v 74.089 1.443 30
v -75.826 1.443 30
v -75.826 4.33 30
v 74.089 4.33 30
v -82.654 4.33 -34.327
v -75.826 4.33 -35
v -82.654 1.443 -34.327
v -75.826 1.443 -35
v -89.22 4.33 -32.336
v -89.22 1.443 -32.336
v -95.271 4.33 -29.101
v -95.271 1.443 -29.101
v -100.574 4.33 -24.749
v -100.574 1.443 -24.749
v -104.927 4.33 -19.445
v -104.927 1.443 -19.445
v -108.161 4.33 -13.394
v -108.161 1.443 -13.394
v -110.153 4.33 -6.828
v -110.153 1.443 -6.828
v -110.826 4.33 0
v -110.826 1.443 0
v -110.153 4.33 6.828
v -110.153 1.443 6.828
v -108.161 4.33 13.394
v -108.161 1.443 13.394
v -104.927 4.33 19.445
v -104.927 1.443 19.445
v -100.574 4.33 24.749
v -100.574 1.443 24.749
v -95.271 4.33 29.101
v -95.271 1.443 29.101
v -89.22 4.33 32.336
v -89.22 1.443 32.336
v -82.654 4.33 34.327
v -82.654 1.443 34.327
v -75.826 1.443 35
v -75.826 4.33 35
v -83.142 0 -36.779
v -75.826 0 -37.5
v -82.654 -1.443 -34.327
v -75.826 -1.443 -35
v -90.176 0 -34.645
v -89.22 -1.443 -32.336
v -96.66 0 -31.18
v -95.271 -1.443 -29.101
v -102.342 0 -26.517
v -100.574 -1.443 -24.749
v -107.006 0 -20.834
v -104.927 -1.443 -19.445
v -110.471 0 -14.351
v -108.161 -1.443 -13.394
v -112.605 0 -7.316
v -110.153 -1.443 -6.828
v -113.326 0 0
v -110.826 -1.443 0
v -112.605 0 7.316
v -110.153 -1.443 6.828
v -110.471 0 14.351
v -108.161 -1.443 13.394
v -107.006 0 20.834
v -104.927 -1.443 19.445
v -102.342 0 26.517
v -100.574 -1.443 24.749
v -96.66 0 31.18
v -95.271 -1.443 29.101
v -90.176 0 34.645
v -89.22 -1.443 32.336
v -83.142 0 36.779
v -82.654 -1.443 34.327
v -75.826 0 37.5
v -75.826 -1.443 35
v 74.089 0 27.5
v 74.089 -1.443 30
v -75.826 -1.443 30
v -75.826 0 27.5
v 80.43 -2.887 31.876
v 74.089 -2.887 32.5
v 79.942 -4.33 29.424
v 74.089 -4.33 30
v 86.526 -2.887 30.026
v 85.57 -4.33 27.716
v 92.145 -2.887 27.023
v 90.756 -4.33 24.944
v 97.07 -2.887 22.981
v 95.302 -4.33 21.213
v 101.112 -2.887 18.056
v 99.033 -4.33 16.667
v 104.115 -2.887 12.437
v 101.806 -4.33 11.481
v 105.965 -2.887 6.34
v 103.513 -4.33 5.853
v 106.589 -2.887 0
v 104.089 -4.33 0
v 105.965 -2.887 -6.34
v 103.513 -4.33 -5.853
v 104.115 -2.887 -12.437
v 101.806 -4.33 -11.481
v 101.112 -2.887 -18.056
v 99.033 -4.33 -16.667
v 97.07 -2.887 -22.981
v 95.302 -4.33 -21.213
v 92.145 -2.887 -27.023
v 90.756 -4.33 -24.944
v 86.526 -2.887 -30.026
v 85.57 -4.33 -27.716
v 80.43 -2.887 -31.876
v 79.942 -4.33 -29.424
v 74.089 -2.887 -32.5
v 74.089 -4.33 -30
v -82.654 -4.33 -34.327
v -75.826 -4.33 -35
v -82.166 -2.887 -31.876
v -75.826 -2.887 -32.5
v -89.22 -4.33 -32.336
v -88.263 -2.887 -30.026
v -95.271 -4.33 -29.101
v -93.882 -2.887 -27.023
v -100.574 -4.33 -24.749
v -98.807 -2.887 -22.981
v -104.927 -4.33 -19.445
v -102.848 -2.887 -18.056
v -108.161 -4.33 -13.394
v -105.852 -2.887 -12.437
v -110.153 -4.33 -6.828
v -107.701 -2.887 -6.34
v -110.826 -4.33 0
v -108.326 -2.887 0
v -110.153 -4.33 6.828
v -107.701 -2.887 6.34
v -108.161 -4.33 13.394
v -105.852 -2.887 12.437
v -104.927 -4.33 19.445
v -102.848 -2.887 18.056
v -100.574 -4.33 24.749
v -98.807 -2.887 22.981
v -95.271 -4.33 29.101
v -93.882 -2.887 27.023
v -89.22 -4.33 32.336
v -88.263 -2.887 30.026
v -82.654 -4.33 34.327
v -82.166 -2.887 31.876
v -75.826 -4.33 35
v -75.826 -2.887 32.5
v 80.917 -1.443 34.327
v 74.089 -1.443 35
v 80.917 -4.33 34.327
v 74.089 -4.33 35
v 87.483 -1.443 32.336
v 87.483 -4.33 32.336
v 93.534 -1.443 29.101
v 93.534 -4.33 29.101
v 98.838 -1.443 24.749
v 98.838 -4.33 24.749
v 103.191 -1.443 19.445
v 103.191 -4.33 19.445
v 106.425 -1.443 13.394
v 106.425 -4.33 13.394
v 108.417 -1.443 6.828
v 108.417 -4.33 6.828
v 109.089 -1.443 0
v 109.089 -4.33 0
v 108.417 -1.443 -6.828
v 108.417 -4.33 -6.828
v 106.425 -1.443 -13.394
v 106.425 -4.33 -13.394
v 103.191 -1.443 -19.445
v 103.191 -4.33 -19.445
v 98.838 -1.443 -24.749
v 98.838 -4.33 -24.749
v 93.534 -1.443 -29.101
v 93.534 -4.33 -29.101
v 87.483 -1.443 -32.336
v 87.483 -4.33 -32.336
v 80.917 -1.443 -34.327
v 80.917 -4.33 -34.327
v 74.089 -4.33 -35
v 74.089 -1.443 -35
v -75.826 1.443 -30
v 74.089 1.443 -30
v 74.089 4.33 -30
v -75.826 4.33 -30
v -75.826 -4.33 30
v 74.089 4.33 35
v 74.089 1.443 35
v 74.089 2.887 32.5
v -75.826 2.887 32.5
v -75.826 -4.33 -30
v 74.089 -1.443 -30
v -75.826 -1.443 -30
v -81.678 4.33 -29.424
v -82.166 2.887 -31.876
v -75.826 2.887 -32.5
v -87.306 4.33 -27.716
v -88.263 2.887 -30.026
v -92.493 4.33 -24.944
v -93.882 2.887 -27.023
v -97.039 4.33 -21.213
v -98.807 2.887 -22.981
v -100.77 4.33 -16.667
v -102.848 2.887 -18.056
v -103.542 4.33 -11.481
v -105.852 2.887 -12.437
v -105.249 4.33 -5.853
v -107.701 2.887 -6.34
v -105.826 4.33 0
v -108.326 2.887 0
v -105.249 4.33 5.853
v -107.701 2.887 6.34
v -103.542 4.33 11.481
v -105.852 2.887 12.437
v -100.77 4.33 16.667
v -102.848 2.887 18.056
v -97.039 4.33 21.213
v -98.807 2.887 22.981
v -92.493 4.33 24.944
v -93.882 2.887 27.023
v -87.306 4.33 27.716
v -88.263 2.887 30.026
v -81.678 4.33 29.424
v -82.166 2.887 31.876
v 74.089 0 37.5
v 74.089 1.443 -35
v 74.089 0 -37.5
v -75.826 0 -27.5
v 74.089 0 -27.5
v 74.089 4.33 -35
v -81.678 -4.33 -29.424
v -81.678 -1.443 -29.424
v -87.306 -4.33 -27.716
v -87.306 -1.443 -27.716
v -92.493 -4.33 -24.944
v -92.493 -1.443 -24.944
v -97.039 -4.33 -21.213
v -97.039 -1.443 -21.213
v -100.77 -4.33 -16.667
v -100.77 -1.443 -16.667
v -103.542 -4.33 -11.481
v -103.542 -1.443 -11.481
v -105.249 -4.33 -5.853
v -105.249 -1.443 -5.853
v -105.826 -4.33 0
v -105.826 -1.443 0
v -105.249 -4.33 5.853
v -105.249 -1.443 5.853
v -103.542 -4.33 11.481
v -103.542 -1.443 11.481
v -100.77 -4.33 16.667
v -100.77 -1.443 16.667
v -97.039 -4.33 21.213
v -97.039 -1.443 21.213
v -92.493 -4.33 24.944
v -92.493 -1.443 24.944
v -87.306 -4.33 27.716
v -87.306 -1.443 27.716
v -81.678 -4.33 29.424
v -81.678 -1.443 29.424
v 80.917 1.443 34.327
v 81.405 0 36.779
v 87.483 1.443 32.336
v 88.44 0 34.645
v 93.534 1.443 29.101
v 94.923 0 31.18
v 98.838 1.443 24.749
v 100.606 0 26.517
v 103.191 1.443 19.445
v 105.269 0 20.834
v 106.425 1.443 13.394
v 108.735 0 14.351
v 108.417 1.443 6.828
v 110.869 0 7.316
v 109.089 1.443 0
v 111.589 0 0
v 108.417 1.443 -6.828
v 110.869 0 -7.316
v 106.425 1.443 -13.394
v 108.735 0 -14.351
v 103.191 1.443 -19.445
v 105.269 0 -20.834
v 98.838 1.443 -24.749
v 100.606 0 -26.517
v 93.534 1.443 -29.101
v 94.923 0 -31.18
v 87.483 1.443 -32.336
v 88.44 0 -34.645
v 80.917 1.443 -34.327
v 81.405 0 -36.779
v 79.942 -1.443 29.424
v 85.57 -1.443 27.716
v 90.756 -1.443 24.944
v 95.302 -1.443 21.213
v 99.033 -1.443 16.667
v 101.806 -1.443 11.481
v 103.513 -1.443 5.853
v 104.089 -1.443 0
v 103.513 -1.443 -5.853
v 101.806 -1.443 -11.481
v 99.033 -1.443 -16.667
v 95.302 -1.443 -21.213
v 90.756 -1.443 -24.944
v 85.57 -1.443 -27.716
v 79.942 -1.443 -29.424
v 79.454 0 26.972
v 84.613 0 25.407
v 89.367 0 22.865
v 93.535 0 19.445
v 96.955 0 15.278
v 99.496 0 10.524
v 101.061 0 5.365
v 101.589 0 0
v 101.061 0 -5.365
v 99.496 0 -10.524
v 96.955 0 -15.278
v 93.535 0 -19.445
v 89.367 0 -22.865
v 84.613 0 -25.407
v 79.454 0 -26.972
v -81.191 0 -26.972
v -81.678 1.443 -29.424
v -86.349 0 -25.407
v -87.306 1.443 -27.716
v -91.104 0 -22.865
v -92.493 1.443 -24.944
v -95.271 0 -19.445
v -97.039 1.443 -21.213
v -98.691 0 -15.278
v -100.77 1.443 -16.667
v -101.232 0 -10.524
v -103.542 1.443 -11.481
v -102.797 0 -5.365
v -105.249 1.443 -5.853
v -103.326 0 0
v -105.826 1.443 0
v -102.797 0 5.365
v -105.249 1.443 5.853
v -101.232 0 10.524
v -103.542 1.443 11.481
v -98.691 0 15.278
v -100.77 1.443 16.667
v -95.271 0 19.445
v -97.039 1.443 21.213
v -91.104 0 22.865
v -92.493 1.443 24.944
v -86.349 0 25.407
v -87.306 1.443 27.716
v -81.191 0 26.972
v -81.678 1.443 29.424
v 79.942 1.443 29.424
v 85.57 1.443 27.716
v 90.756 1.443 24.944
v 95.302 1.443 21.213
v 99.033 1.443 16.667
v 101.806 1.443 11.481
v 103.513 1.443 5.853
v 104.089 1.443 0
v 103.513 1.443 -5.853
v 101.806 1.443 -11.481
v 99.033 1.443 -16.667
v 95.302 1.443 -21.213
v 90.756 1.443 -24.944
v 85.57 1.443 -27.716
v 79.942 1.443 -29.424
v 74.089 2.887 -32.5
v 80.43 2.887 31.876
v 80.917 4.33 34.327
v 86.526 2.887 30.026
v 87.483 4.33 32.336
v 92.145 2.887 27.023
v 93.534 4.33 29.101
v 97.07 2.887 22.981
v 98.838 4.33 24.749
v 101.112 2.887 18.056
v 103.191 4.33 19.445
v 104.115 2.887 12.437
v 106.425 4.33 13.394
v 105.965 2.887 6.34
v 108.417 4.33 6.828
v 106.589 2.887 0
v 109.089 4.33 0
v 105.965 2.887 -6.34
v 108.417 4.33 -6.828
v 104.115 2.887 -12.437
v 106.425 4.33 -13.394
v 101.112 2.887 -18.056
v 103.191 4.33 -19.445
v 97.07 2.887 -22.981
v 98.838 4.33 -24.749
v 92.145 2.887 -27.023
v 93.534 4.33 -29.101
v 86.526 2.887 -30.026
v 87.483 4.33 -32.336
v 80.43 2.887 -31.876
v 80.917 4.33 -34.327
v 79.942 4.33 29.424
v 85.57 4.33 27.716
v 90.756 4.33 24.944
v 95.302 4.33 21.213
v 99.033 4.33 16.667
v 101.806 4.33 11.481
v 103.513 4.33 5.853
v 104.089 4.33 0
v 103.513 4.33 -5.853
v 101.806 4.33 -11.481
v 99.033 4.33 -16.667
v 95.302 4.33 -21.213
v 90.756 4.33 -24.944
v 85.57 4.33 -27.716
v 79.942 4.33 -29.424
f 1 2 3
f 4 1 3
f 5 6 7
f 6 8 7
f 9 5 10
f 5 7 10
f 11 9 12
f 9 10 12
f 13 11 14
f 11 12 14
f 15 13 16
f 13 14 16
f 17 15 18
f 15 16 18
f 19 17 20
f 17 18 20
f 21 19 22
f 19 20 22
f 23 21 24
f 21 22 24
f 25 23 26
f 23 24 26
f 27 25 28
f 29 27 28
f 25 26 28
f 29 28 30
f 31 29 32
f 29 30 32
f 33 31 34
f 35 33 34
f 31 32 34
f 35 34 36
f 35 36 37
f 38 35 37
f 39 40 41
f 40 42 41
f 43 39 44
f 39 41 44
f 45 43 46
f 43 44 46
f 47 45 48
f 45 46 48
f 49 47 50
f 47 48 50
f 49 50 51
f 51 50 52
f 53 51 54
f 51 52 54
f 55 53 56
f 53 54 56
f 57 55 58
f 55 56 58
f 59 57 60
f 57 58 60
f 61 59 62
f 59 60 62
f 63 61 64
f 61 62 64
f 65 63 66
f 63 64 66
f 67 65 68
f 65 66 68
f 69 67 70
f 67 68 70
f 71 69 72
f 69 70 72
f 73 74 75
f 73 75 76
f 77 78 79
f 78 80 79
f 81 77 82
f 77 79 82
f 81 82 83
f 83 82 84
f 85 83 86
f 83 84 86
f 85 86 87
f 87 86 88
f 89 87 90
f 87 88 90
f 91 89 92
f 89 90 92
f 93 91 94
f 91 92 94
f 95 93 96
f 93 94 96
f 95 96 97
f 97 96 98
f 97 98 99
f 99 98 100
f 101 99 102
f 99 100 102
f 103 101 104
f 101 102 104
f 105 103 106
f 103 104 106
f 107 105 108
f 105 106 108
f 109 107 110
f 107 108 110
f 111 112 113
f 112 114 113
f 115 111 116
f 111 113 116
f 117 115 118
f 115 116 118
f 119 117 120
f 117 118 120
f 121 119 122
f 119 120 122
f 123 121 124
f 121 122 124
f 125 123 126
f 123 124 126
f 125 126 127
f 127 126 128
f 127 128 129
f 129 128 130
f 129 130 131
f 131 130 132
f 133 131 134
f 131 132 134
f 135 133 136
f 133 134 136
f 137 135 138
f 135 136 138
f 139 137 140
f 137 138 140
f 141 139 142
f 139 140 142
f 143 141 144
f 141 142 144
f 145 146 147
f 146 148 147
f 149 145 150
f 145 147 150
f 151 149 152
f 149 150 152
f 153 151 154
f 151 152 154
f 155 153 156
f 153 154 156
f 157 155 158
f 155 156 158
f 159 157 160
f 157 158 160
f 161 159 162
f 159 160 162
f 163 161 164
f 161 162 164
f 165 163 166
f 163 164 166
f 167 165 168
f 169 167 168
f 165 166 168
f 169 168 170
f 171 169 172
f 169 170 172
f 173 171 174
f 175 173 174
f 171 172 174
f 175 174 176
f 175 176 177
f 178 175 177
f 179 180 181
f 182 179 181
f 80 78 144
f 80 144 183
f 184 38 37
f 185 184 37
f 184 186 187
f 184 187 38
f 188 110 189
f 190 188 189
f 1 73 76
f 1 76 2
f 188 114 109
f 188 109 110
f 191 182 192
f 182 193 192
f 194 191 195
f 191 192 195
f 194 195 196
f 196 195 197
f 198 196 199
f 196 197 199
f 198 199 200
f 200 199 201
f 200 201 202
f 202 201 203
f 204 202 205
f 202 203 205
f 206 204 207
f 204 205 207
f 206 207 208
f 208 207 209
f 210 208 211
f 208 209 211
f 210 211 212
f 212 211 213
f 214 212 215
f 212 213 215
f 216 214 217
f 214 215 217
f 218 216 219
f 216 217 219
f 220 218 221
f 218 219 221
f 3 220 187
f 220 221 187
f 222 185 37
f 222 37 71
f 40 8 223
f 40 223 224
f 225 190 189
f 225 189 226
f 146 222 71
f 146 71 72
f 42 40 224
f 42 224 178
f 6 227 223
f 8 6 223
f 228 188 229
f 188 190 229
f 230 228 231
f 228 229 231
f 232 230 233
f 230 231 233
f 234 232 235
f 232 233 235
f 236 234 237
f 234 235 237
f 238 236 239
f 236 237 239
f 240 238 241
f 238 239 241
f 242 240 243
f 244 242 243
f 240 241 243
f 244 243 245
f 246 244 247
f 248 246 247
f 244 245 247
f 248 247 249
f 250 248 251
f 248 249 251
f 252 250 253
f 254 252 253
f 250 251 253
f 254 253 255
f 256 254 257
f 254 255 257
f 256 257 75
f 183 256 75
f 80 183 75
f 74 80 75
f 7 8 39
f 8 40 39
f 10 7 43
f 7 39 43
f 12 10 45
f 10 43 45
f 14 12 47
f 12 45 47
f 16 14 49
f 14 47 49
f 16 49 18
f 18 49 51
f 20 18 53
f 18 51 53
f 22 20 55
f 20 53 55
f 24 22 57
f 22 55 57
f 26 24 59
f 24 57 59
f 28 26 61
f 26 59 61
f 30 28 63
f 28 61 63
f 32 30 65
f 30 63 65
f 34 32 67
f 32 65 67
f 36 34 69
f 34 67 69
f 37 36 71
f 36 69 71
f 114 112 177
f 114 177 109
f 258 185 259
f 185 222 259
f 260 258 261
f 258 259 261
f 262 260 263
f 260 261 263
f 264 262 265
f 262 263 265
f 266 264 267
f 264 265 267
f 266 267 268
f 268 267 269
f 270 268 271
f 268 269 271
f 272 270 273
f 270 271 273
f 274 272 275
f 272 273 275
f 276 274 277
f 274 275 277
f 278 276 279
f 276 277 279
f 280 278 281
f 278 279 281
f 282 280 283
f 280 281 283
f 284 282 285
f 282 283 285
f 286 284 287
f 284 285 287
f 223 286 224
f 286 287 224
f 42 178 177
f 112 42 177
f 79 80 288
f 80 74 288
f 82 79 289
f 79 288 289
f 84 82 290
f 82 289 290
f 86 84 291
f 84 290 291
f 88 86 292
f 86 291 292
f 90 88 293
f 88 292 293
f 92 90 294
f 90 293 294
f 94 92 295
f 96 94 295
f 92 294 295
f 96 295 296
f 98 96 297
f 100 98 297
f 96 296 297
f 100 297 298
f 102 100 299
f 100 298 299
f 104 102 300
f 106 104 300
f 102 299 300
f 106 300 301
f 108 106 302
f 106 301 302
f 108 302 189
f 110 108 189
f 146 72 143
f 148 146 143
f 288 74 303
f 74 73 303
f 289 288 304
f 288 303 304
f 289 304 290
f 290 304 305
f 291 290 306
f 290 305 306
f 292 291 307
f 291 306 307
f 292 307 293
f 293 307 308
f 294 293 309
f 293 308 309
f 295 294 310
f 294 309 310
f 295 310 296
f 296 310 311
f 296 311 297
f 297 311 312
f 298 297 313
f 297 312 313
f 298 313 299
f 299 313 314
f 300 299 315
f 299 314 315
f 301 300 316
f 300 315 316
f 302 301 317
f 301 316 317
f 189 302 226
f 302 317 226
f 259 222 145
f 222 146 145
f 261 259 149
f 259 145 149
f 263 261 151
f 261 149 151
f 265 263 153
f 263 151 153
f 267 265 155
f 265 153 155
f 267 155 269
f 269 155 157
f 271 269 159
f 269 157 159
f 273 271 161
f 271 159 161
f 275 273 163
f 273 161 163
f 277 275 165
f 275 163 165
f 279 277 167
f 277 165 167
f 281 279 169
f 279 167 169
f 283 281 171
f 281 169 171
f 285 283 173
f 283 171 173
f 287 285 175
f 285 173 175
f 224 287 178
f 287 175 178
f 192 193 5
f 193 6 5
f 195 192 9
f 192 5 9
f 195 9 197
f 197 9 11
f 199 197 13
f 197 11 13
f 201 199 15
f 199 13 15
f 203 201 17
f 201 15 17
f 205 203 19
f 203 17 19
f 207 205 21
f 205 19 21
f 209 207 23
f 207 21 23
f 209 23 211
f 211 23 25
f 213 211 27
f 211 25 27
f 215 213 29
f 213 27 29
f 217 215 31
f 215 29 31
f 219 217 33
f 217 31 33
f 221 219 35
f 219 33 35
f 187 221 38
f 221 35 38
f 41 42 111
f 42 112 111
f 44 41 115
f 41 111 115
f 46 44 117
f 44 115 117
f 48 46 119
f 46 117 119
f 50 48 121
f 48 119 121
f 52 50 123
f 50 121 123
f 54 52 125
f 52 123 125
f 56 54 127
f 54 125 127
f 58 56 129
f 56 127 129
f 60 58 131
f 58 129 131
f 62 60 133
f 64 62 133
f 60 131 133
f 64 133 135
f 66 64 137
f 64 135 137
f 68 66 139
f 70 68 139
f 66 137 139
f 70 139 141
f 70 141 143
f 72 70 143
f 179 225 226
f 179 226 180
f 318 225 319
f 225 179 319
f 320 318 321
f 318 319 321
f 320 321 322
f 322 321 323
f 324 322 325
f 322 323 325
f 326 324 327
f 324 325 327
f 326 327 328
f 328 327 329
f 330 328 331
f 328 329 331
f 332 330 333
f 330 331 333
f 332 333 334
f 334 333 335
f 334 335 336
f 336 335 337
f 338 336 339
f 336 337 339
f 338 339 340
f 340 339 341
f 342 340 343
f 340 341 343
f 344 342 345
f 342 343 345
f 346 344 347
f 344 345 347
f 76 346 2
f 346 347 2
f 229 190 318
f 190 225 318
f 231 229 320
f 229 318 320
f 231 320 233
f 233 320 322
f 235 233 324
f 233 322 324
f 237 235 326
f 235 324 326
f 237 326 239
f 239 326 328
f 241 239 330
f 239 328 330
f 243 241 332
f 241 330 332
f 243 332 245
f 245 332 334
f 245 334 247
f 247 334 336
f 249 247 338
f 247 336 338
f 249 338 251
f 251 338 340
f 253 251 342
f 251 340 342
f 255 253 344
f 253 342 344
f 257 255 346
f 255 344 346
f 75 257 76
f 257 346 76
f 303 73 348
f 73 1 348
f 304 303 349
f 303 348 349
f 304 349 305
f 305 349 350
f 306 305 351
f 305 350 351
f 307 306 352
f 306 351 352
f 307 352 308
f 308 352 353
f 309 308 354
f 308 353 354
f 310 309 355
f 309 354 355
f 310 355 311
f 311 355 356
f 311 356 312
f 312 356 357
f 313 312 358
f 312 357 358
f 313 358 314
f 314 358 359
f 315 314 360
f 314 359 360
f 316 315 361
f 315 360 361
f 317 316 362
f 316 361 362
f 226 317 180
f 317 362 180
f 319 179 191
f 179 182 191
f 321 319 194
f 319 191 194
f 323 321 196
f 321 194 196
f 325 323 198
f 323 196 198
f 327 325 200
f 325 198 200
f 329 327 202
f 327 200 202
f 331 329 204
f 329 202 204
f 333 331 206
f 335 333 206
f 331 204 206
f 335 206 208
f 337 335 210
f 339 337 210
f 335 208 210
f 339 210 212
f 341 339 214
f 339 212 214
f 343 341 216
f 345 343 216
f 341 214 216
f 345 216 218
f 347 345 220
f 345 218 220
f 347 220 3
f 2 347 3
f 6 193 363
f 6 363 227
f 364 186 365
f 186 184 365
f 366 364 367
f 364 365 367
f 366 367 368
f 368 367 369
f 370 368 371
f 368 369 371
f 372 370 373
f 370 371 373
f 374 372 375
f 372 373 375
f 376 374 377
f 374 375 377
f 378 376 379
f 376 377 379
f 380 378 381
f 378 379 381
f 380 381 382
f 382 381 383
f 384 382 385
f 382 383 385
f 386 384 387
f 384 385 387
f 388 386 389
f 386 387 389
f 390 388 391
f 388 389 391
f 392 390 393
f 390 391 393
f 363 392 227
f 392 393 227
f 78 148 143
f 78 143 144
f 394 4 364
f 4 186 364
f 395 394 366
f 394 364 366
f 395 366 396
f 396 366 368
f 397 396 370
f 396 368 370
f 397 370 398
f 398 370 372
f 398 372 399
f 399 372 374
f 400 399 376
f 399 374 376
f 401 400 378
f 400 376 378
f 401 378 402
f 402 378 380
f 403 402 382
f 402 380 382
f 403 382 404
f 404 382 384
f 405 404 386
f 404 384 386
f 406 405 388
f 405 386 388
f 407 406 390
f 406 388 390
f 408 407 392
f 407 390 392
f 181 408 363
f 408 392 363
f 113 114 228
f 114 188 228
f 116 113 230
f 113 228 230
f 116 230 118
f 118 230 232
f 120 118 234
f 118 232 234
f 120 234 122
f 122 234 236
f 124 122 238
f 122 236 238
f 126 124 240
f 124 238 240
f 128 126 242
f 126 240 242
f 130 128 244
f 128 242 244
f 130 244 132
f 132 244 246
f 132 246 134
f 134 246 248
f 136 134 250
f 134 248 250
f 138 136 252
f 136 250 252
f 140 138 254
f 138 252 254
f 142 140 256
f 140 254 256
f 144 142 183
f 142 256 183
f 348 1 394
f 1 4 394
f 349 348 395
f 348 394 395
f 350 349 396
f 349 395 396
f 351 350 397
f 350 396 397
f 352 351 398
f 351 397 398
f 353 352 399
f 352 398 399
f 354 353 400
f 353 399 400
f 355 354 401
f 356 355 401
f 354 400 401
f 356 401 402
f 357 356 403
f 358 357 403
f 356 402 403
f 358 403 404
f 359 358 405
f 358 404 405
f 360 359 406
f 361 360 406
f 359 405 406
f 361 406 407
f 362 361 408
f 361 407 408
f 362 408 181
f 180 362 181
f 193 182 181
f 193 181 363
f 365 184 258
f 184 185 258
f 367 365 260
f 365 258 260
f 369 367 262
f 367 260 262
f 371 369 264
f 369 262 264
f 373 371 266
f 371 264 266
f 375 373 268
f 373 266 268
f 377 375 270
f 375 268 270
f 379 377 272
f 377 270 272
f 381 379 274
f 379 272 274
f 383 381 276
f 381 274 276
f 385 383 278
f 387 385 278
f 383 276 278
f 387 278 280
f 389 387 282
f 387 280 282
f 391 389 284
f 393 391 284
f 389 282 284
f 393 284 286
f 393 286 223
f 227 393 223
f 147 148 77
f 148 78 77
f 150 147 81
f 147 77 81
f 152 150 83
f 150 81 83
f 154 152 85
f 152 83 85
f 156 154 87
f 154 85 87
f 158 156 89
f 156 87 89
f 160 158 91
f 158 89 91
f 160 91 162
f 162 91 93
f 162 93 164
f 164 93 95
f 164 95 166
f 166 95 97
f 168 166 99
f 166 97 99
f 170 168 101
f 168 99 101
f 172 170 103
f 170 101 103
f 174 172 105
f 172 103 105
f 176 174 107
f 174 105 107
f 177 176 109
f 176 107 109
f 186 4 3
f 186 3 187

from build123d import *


with BuildPart() as f3:
    # F3: sweep along a path in F0
    with BuildLine(Plane.XZ) as f3_path:
        Line((-75.8256912231, 30), (74.0892291069, 30))
        ThreePointArc((74.0892291069, 30), (104.0892291069, 0), (74.0892291069, -30))
        Line((74.0892291069, -30), (-75.8256912231, -30))
        ThreePointArc((-75.8256912231, -30), (-105.8256912231, 0), (-75.8256912231, 30))
    # F2 (on plane+point) → F3 (sweep)
    with BuildSketch(Plane.YZ.offset(74.0892291069)):
        Polygon((1.443375673, 35), (2.8867513459, 32.5), (4.3301270189, 35), align=None)
        Polygon((-1.443375673, 35), (1.443375673, 35), (0, 37.5), align=None)
        Polygon((-4.3301270189, 35), (-2.8867513459, 32.5), (-1.443375673, 35), align=None)
        Polygon((-4.3301270189, 30), (-1.443375673, 30), (-2.8867513459, 32.5), align=None)
        Polygon((0, 27.5), (1.443375673, 30), (-1.443375673, 30), align=None)
        Polygon((1.443375673, 30), (4.3301270189, 30), (2.8867513459, 32.5), align=None)
        Polygon((-1.443375673, 30), (1.443375673, 30), (2.8867513459, 32.5), (1.443375673, 35), (-1.443375673, 35), (-2.8867513459, 32.5), align=None)
    sweep(path=f3_path.line)


solid = f3.part
